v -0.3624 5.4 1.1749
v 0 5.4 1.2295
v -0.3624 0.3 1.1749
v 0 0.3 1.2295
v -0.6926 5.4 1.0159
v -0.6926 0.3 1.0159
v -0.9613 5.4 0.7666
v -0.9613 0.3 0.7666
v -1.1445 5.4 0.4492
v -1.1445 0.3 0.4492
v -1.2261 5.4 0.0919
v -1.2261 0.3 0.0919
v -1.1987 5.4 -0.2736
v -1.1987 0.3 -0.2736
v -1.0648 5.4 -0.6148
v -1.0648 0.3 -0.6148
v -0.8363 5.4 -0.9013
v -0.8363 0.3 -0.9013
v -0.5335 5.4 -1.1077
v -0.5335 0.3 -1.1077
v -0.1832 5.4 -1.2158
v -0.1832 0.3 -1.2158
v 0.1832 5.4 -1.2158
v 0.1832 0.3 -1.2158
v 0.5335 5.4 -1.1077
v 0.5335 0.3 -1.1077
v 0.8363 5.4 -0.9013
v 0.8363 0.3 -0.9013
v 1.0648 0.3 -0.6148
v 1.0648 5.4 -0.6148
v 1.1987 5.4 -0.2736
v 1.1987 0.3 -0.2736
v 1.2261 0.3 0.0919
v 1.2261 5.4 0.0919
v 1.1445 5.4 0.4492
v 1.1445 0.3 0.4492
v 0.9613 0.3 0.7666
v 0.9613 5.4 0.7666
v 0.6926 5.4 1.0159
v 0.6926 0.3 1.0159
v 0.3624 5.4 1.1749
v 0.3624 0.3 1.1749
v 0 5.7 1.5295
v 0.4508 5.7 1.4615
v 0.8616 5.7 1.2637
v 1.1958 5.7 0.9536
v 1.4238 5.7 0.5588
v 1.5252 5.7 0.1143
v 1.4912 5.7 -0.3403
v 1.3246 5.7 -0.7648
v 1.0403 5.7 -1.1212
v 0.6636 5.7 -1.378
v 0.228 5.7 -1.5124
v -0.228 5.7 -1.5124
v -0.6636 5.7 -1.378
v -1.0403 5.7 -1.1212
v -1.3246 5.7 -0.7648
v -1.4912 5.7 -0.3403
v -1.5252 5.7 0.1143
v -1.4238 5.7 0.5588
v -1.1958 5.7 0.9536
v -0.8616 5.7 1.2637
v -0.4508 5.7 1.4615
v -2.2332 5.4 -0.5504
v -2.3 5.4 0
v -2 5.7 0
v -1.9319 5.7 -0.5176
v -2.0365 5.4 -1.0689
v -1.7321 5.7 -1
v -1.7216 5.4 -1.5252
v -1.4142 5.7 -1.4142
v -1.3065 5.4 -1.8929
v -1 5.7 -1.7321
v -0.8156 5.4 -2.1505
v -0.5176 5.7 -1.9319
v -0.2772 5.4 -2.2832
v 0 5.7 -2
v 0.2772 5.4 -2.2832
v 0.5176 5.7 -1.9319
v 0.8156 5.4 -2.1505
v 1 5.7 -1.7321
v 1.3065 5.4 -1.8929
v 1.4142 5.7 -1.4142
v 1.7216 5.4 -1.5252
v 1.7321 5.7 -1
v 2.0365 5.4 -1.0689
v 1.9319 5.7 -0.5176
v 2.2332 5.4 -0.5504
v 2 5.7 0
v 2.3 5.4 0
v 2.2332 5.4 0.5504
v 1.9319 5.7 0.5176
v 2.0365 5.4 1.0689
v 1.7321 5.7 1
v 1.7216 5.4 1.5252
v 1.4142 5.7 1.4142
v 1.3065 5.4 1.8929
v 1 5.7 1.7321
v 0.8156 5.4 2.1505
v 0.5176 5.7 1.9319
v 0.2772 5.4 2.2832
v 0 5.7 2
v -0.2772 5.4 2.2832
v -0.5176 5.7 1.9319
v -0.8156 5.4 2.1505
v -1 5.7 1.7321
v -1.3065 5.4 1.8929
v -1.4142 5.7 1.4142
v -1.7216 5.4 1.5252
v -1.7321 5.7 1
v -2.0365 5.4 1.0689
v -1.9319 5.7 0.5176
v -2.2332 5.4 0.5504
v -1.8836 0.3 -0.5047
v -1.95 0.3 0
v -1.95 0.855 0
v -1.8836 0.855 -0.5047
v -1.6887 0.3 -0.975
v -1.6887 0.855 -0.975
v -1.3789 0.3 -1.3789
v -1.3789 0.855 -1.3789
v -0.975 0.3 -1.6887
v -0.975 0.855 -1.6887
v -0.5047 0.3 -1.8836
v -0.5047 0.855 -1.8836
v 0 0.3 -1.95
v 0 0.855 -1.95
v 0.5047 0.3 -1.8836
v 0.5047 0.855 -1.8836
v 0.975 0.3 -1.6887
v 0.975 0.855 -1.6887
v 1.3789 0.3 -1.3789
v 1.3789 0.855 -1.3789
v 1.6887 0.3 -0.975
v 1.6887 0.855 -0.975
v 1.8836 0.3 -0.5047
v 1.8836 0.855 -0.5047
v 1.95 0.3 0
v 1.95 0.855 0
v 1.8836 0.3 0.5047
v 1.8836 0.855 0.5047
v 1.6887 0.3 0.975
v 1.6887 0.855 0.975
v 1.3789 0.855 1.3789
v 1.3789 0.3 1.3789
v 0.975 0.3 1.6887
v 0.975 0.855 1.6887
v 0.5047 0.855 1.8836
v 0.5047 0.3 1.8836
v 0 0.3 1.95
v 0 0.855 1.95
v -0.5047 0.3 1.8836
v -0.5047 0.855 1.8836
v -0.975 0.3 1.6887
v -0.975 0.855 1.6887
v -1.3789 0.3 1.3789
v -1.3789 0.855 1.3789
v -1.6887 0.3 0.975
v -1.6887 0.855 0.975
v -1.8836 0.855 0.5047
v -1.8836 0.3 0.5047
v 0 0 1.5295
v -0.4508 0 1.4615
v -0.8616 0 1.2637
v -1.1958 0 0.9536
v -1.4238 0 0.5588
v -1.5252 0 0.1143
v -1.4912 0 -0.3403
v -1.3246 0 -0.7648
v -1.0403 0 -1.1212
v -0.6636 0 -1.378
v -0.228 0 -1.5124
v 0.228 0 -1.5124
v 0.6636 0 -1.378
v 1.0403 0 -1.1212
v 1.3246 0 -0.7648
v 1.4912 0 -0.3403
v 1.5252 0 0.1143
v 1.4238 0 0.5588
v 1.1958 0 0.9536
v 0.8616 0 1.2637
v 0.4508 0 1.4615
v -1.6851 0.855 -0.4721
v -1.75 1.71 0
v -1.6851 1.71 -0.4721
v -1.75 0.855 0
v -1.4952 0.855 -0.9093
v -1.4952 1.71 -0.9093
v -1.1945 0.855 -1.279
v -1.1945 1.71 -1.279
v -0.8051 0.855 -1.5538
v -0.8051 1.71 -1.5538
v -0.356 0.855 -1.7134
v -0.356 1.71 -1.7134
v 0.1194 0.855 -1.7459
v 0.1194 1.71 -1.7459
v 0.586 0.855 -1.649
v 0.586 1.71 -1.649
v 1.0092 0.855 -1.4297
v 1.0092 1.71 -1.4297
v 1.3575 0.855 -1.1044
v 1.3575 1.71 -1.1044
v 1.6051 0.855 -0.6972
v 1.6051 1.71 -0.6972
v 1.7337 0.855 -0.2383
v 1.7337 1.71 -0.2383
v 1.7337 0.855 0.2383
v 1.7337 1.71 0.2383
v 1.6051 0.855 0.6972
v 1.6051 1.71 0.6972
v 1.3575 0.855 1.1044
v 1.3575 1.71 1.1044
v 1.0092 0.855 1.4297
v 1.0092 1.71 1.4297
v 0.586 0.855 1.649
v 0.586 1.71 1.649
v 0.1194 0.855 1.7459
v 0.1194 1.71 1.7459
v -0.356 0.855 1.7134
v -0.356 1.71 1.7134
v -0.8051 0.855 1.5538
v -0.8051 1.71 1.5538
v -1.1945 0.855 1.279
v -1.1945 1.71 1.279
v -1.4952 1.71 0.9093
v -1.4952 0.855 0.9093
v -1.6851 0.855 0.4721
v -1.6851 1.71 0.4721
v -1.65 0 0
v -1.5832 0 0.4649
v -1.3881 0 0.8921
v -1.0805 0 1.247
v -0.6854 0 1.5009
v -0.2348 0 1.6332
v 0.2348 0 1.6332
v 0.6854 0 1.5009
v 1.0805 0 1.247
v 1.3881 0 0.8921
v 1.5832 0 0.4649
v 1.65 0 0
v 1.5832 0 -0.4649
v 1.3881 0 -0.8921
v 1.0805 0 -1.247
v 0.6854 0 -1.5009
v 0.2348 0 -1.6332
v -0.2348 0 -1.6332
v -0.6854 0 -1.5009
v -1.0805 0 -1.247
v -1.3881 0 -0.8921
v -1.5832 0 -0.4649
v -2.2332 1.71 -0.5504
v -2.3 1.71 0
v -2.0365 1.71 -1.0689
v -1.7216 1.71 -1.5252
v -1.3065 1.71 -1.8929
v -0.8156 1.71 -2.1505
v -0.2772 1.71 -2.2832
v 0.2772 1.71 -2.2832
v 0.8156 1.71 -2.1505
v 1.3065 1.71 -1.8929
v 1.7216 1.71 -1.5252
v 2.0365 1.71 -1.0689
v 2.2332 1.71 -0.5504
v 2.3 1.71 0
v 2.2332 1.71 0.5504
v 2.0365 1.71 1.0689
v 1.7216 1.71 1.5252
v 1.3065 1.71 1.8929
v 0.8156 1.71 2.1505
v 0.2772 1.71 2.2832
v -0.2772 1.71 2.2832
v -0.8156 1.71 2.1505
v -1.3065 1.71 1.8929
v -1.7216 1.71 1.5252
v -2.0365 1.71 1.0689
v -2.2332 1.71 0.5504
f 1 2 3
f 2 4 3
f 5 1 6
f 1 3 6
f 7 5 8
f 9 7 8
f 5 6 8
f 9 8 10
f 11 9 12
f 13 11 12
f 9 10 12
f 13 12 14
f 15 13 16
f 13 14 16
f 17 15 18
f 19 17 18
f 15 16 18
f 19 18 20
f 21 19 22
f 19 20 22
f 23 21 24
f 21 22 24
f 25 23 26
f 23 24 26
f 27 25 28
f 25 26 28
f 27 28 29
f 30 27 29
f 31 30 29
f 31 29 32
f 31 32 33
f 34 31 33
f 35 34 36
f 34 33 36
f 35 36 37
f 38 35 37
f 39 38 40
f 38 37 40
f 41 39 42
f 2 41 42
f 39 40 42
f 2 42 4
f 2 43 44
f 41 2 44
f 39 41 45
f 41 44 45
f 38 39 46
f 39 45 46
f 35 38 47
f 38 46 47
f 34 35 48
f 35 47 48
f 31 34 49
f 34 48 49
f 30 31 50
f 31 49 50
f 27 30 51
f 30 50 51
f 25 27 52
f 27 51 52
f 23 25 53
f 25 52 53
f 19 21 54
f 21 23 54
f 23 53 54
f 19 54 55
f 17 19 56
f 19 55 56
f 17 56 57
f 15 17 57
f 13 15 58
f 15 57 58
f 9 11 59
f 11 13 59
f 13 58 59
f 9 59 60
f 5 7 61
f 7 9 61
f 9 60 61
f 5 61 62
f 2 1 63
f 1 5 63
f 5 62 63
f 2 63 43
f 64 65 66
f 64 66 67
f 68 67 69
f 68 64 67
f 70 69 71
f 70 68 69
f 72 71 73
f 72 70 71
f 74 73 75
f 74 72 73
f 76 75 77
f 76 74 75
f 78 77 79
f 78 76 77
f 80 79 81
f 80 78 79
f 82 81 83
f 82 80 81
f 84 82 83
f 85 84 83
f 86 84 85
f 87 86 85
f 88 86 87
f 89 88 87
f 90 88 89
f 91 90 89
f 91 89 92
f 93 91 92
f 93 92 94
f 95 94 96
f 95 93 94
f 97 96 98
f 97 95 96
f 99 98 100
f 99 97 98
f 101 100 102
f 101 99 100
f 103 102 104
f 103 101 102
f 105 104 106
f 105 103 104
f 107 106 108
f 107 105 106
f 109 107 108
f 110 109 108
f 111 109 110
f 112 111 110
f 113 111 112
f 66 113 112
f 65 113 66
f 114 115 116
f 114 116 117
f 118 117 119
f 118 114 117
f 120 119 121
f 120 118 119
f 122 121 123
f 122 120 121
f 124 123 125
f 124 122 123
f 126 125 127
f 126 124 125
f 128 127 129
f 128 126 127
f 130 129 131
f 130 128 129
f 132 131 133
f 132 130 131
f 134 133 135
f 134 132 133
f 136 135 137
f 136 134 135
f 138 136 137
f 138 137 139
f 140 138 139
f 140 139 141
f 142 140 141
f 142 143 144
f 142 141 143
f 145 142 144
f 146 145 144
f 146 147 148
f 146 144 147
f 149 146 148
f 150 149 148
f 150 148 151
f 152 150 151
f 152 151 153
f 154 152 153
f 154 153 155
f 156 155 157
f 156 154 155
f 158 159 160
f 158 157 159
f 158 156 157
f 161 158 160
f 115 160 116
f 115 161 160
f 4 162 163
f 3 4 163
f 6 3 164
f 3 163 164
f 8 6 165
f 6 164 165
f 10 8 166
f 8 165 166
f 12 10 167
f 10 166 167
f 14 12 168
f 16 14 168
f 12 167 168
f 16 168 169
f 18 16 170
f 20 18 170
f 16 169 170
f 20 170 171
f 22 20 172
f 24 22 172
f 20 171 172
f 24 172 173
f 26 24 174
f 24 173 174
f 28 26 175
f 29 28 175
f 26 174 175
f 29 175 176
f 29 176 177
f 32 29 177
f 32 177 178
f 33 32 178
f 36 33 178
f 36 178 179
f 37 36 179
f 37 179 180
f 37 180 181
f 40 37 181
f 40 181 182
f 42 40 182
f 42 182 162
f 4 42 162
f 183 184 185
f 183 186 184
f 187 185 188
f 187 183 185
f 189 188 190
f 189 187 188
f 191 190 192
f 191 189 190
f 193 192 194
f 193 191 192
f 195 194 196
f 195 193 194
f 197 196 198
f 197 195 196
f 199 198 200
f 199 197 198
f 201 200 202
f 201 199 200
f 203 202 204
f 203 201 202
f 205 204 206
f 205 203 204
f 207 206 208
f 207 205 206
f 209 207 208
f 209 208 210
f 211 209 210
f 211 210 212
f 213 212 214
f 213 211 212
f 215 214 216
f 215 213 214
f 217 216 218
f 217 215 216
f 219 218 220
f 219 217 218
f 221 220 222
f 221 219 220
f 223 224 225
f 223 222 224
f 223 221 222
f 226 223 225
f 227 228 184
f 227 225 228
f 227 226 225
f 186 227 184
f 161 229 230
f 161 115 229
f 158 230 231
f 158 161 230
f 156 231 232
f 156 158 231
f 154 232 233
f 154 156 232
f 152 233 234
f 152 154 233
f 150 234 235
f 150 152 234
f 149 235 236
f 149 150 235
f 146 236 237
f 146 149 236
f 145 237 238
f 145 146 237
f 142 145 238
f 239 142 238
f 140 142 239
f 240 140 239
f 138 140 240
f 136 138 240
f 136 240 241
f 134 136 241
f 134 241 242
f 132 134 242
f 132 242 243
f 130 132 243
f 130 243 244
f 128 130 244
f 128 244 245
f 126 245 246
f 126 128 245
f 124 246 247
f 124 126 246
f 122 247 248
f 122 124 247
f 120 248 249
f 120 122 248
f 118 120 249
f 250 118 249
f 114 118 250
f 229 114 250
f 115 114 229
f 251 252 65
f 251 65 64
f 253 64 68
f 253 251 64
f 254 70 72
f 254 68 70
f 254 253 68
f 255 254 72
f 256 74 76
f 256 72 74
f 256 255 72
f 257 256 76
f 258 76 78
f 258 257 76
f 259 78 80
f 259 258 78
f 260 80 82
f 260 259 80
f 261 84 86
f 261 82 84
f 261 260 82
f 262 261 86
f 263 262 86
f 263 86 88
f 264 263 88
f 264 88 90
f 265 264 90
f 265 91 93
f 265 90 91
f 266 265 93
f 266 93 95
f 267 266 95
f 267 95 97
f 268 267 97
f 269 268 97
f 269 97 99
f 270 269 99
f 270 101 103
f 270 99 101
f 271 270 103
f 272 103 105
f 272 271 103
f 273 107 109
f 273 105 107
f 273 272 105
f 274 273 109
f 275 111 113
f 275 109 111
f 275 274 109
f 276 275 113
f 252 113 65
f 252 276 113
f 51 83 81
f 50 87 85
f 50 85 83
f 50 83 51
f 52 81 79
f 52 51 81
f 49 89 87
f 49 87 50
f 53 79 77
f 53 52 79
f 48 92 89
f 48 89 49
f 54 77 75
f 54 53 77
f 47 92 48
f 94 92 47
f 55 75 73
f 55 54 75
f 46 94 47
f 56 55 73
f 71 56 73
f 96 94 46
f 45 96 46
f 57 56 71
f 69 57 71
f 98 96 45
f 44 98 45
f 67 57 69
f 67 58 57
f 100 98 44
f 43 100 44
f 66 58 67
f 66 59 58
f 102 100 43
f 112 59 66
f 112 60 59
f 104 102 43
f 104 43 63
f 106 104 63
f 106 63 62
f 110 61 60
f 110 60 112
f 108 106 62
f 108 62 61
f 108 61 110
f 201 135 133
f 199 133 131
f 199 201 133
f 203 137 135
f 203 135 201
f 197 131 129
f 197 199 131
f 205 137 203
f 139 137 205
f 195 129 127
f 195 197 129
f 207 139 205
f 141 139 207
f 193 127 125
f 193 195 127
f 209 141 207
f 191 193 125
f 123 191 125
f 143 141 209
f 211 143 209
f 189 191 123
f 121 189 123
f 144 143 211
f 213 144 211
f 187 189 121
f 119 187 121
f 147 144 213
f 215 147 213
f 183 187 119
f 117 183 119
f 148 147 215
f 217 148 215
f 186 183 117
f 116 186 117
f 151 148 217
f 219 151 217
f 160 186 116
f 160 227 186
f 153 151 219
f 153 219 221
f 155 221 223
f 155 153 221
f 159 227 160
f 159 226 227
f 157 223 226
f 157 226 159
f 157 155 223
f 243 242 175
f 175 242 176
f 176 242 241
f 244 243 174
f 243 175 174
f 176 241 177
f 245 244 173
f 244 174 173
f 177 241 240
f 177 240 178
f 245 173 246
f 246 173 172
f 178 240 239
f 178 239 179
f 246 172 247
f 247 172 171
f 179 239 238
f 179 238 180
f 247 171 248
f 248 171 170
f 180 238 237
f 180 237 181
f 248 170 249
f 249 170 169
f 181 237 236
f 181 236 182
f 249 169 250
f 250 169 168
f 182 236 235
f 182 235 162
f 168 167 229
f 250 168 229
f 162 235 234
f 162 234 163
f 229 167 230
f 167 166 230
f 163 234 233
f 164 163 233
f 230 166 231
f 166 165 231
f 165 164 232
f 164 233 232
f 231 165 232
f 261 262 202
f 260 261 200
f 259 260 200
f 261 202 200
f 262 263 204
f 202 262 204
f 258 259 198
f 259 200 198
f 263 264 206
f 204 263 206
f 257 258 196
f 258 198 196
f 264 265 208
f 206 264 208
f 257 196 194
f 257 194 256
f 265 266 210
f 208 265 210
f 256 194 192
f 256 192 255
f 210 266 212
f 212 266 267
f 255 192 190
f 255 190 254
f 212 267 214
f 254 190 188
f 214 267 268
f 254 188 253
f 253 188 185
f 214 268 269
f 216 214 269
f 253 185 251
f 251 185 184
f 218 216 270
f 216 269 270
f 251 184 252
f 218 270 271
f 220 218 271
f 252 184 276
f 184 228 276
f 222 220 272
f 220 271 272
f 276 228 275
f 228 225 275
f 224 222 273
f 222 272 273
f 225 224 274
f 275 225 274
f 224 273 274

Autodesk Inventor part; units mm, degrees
ref_plane "YZ Plane" through (0, 0, 0) normal (1, 0, 0) x (0, 1, 0)
ref_plane "XZ Plane" through (0, 0, 0) normal (0, 1, 0) x (-1, 0, 0)
ref_plane "XY Plane" through (0, 0, 0) normal (0, 0, 1) x (1, 0, 0)
sketch "Skizze1" plane through (0, 0, 0) normal (0, 0, 1) x (1, 0, 0)
  line L0 (0, 0) -> (0, 5.7)
  line L1 (0, 5.7) -> (-2.3, 5.7)
  line L2 (-2.3, 5.7) -> (-2.3, 1.71)
  line L3 (-2.3, 1.71) -> (-1.75, 1.71)
  line L4 (-1.75, 1.71) -> (-1.75, 0.855)
  line L5 (-1.75, 0.855) -> (-1.95, 0.855)
  line L6 (-1.95, 0.855) -> (-1.95, 0)
  line L7 (-1.95, 0) -> (0, 0)
  dimension "d0" = 4.6
  dimension "d1" = 5.7
  dimension "d2" = 3.9
  dimension "d3" = 0.2
  dimension "d4" = 3.99
revolve "Umdrehung1" add sketch "Skizze1" angle 360 about axis through (0, 0, 0) along (0, 1, 0)
sketch "Skizze2" plane through (0, 5.7, 0) normal (0, 1, 0) x (1, 0, 0)
  circle A0 centre (0, 0) radius 2.3 projected
hole "Bohrung1" at (0, 5.7, 0) direction (0, -1, 0) diameter 2.459 end through all thread size "M3x0.5" class "6H" standard "ISO Metric profile"
chamfer "Fase1" distance 0.3 angle 45 4 edges at (0, 5.7, -1.2295) (1.95, 0, 0) (0, 0, -1.2295) (2.3, 5.7, 0)
equation "\"d4\" = 0.7 * d1"
properties part number "RX-M3x5,7" material "Messing, weicher Gelbton"
